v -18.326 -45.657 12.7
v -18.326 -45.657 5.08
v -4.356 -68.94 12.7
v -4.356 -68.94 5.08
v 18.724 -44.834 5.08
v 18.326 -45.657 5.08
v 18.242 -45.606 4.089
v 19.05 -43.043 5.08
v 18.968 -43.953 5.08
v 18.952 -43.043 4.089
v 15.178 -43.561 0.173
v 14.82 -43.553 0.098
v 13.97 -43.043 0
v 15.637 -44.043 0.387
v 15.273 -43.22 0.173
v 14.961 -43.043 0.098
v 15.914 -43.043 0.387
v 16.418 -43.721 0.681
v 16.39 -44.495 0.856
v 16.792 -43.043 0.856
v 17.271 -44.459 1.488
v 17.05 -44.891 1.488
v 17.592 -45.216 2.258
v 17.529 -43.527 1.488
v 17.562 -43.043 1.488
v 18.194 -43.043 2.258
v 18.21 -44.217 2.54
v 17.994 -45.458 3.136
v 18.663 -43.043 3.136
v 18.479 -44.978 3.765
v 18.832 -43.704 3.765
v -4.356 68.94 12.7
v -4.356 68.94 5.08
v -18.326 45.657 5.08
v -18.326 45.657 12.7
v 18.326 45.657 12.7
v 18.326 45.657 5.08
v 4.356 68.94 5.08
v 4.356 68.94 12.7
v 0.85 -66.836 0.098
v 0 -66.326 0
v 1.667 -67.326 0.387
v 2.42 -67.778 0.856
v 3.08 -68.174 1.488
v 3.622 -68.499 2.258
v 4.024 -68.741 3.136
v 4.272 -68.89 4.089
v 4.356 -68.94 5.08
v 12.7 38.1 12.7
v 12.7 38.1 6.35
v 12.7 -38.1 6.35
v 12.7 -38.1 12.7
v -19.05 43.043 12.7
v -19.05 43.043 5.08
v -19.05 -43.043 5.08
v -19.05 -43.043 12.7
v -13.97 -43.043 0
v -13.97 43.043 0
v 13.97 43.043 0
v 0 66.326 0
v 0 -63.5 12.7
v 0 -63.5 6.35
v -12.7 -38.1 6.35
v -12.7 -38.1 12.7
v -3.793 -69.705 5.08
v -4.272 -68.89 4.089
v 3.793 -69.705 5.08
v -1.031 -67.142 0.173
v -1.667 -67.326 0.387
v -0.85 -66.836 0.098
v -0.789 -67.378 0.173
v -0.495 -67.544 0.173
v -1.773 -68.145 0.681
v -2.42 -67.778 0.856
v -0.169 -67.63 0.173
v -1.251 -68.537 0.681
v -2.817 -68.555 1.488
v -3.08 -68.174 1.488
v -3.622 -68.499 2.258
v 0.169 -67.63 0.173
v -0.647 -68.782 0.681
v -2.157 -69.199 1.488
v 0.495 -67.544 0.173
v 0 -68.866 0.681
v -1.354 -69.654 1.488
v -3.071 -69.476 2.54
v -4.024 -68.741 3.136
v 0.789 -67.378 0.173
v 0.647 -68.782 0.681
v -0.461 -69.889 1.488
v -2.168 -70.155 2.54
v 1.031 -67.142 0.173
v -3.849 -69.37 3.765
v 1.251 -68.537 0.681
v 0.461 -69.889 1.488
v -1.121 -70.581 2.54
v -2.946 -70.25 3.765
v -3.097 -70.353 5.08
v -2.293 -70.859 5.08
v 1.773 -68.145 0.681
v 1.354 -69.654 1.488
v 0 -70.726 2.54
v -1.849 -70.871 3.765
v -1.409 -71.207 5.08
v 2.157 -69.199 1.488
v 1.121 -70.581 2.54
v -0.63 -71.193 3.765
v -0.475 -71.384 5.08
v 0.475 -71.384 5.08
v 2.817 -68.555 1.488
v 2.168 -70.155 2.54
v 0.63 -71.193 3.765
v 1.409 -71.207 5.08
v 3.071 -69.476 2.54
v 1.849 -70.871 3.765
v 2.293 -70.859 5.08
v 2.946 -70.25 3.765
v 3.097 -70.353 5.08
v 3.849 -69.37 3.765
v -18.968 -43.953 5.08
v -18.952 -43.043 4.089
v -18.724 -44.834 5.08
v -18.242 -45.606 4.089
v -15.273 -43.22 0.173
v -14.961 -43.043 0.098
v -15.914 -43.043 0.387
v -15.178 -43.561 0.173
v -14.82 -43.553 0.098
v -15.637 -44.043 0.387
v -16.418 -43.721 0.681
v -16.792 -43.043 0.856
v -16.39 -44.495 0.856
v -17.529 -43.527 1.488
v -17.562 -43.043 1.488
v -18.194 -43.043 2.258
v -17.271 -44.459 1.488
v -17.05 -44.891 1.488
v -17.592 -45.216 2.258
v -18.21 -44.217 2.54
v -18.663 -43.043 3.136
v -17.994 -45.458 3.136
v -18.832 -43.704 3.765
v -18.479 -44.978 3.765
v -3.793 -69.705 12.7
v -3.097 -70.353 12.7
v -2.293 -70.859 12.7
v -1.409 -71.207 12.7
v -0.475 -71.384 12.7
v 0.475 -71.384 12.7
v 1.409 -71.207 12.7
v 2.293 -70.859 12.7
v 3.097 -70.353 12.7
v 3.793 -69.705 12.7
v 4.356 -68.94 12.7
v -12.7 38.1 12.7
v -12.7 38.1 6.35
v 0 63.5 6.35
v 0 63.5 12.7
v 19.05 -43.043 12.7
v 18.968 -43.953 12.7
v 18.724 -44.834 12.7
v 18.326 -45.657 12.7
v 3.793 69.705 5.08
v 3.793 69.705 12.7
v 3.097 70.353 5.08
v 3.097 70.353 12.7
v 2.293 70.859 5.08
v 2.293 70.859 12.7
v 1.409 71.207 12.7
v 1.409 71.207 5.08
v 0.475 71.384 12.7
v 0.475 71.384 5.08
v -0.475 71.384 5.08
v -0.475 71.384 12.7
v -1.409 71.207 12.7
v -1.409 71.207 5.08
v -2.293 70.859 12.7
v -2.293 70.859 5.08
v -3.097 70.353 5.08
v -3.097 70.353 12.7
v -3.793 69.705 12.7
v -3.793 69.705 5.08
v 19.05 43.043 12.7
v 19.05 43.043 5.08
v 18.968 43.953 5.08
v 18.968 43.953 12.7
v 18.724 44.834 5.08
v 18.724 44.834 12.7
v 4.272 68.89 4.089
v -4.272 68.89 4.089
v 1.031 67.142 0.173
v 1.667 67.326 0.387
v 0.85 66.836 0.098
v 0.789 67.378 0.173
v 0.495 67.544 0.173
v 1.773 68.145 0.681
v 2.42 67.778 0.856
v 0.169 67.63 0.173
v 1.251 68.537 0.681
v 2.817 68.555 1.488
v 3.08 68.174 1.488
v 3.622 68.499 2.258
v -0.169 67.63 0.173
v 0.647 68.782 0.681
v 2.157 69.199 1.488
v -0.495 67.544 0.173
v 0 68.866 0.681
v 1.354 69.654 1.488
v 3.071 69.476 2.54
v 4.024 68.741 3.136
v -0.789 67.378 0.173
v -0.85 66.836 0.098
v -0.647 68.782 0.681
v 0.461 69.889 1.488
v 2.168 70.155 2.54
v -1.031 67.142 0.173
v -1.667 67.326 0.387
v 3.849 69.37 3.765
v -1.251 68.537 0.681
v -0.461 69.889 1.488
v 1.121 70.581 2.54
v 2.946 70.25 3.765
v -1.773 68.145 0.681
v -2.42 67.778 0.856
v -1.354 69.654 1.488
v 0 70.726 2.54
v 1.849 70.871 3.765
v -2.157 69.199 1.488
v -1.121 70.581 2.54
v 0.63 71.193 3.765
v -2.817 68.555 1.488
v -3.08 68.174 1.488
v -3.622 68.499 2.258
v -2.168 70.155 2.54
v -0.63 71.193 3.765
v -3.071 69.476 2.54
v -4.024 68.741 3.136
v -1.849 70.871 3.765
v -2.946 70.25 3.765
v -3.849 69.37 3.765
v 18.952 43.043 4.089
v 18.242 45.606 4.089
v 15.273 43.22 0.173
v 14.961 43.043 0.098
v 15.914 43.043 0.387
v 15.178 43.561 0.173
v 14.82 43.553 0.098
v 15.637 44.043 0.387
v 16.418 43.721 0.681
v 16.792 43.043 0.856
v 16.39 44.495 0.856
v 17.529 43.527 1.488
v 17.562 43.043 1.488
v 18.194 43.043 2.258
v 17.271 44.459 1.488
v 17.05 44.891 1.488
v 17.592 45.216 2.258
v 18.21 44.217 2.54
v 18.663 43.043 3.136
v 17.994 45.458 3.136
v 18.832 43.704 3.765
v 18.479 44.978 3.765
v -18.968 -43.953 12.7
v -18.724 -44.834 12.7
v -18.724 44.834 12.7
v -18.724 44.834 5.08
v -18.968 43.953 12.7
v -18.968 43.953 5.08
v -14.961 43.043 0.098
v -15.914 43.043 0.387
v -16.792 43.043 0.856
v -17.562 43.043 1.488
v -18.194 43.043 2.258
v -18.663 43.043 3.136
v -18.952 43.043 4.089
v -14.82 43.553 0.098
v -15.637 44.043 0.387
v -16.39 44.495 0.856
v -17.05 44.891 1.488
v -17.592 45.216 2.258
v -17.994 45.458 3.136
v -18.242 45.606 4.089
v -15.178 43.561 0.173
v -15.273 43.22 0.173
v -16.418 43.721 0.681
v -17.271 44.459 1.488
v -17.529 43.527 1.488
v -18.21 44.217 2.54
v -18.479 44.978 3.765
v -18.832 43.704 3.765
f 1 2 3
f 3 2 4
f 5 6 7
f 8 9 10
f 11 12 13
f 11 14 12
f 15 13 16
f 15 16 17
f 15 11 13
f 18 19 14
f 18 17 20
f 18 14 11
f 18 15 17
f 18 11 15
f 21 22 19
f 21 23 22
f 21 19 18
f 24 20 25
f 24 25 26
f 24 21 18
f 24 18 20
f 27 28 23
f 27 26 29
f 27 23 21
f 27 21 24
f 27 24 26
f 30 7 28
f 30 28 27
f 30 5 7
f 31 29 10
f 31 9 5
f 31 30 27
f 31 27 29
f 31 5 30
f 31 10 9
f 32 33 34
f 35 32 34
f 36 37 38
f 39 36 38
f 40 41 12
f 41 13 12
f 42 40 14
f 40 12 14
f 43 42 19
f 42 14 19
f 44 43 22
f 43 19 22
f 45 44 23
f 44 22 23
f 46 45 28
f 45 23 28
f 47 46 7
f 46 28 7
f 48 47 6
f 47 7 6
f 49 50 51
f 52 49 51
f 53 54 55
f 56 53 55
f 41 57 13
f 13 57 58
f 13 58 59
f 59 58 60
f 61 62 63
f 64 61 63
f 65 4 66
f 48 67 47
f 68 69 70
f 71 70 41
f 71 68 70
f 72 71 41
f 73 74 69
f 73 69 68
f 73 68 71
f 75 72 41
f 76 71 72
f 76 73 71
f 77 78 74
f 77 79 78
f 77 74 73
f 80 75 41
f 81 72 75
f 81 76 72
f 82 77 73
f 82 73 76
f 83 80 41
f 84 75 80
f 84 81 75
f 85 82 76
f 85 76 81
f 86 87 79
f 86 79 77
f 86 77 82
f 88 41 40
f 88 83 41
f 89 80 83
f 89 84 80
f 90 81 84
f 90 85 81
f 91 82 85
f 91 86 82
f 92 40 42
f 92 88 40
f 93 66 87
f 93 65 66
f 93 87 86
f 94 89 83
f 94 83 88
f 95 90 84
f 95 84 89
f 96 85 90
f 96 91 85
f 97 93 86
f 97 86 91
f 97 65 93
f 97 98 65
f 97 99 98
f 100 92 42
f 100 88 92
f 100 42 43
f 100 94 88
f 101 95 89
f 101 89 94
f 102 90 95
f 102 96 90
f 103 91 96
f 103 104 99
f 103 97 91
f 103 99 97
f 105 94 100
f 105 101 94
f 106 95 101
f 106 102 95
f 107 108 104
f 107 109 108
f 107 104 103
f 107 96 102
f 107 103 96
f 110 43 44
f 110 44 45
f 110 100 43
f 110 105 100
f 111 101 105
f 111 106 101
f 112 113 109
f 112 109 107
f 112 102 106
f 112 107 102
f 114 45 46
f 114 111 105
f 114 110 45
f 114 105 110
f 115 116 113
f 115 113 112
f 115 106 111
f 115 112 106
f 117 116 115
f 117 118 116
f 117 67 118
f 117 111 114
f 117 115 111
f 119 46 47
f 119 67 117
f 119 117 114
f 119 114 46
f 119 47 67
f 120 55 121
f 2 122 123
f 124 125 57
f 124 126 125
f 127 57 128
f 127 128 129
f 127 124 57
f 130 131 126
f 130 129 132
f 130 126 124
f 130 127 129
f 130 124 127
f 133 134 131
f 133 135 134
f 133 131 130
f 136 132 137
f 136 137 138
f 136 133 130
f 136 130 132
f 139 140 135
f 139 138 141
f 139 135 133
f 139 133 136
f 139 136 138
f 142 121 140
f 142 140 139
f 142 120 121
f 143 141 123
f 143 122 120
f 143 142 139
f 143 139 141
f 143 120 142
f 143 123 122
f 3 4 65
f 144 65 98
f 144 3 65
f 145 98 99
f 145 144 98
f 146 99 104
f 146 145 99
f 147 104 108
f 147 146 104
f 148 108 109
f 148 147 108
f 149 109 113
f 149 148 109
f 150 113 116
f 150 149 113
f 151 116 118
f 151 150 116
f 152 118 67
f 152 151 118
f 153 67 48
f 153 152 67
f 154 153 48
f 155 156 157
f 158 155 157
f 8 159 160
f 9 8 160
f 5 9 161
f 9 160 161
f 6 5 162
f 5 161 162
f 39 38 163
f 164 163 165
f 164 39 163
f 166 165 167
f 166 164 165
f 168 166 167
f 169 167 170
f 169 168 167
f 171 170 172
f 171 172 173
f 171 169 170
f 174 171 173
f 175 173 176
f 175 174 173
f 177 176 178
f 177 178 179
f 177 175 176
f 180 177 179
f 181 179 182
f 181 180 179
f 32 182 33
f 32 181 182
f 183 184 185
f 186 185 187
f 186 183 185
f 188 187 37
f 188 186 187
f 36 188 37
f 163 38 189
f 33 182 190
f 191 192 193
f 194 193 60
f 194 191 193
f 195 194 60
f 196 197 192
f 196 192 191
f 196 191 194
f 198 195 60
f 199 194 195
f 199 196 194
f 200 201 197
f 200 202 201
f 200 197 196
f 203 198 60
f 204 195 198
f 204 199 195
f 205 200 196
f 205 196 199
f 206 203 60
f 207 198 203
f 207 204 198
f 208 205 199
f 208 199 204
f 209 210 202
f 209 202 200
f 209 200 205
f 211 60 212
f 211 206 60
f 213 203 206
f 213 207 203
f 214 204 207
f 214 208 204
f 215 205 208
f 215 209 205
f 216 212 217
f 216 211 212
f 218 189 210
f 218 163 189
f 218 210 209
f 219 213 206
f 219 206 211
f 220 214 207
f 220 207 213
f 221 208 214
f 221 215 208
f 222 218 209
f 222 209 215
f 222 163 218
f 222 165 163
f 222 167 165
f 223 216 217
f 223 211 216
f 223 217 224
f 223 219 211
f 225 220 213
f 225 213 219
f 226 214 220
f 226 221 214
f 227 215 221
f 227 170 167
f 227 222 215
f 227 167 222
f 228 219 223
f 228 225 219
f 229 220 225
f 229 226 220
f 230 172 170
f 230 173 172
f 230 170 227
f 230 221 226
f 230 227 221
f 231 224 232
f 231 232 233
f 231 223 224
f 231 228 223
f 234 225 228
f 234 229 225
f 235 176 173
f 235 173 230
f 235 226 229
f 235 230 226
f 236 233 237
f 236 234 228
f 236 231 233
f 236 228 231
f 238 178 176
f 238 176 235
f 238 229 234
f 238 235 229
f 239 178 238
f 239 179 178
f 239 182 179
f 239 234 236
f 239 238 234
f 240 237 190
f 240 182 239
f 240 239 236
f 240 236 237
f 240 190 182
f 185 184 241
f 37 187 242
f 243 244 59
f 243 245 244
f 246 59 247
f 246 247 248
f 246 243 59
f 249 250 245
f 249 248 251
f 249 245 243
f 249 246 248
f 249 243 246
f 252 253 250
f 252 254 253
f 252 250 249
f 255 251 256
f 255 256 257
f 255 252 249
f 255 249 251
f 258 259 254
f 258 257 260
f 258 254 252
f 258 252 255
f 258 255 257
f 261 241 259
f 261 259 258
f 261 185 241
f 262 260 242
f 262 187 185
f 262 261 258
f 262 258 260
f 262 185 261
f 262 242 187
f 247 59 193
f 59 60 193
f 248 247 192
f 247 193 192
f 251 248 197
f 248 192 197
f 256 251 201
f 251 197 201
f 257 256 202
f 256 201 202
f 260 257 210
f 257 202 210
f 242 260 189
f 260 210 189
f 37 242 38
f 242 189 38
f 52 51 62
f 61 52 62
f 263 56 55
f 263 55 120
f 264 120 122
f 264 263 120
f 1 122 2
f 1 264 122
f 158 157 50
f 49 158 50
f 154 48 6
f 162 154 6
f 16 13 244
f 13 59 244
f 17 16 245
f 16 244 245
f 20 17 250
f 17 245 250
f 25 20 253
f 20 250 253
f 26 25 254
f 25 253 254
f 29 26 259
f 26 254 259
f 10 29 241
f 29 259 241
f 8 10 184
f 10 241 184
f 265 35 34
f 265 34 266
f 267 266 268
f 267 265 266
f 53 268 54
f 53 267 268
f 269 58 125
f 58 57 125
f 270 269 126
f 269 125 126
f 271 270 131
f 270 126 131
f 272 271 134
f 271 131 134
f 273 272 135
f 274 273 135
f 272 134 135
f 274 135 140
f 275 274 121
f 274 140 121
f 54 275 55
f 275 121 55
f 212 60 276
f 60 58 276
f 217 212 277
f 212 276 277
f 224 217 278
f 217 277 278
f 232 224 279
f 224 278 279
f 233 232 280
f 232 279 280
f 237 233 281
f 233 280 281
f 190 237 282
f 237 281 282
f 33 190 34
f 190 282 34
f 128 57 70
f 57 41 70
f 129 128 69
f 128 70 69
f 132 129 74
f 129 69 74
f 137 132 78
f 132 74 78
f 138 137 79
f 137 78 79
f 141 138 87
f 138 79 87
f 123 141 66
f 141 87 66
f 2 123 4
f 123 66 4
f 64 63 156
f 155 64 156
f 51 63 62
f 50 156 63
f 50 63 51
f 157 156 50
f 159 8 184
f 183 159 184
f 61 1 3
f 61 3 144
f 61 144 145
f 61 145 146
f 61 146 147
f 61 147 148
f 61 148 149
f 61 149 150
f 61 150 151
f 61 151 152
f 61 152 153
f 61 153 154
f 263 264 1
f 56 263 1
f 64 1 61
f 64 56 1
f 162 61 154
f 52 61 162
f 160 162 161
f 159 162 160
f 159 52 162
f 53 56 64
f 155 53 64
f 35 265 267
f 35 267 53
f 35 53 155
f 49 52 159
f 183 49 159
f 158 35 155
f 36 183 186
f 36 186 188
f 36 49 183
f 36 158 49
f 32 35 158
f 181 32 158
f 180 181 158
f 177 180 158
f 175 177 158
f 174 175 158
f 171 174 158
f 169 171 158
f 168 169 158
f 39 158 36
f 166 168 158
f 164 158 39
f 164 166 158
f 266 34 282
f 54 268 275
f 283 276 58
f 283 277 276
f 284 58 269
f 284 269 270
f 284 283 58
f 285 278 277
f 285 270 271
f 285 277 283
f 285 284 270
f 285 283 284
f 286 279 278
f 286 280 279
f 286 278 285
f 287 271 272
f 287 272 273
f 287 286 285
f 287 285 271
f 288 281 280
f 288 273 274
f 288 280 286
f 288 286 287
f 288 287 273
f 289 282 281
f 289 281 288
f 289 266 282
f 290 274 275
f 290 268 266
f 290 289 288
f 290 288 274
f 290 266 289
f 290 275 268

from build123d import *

# Parameters (mm, degrees)
F1_DEPTH = 12.7
F2_DEPTH = 6.35
F3_R     = 5.08
F4_R     = 5.08


with BuildPart() as f1:
    # F0 (on Top) → F1 (new body)
    with BuildSketch(Plane.XY):
        Polygon((-9.525, 44.45), (0, 63.5), (0, 76.2), (-19.05, 44.45), align=None)
        Polygon((0, 63.5), (9.525, 44.45), (19.05, 44.45), (0, 76.2), align=None)
        Polygon((9.525, 44.45), (12.7, 38.1), (12.7, -38.1), (9.525, -44.45), (19.05, -44.45), (19.05, 44.45), align=None)
        Polygon((-12.7, -38.1), (-12.7, 38.1), (-9.525, 44.45), (-19.05, 44.45), (-19.05, -44.45), (-9.525, -44.45), align=None)
        Polygon((0, -76.2), (0, -63.5), (-9.525, -44.45), (-19.05, -44.45), align=None)
        Polygon((19.05, -44.45), (9.525, -44.45), (0, -63.5), (0, -76.2), align=None)
    extrude(amount=F1_DEPTH)

    # F0 (on Top) → F2 (join)
    with BuildSketch(Plane.XY):
        Polygon((0, 38.1), (12.7, 38.1), (9.525, 44.45), (0, 44.45), align=None)
        Polygon((-12.7, 38.1), (0, 38.1), (0, 44.45), (-9.525, 44.45), align=None)
        Polygon((0, 44.45), (0, 63.5), (-9.525, 44.45), align=None)
        Polygon((0, 44.45), (9.525, 44.45), (0, 63.5), align=None)
        Polygon((12.7, -38.1), (12.7, 38.1), (0, 38.1), (-12.7, 38.1), (-12.7, -38.1), (0, -38.1), align=None)
        Polygon((0, -63.5), (9.525, -44.45), (0, -44.45), align=None)
        Polygon((-9.525, -44.45), (0, -63.5), (0, -44.45), align=None)
        Polygon((0, -44.45), (0, -38.1), (-12.7, -38.1), (-9.525, -44.45), align=None)
        Polygon((9.525, -44.45), (12.7, -38.1), (0, -38.1), (0, -44.45), align=None)
    extrude(amount=F2_DEPTH)

    # F3
    f3_edges = [f1.edges().sort_by_distance(p)[0] for p in [
        (19.05, -44.45, 6.35),
        (0, -76.2, 6.35),
        (-19.05, -44.45, 6.35),
        (-19.05, 44.45, 6.35),
        (0, 76.2, 6.35),
        (19.05, 44.45, 6.35),
    ]]
    fillet(f3_edges, radius=F3_R)

    # F4
    f4_edges = [f1.edges().sort_by_distance(p)[0] for p in [
        (-19.05, 0, 0),
    ]]
    fillet(f4_edges, radius=F4_R)


solid = f1.part
